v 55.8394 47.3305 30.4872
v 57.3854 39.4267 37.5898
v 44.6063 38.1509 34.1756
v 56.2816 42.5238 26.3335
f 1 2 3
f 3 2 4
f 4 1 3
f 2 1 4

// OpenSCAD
// Auto-generated auxetic polyhedron
points = [
    [44.606260, 38.150867, 34.175610],
    [57.385443, 39.426693, 37.589793],
    [55.839436, 47.330456, 30.487188],
    [56.281613, 42.523814, 26.333541],
];

faces = [
    [0, 1, 2],
    [3, 1, 0],
    [0, 2, 3],
    [3, 2, 1],
];

polyhedron(points = points, faces = faces);
